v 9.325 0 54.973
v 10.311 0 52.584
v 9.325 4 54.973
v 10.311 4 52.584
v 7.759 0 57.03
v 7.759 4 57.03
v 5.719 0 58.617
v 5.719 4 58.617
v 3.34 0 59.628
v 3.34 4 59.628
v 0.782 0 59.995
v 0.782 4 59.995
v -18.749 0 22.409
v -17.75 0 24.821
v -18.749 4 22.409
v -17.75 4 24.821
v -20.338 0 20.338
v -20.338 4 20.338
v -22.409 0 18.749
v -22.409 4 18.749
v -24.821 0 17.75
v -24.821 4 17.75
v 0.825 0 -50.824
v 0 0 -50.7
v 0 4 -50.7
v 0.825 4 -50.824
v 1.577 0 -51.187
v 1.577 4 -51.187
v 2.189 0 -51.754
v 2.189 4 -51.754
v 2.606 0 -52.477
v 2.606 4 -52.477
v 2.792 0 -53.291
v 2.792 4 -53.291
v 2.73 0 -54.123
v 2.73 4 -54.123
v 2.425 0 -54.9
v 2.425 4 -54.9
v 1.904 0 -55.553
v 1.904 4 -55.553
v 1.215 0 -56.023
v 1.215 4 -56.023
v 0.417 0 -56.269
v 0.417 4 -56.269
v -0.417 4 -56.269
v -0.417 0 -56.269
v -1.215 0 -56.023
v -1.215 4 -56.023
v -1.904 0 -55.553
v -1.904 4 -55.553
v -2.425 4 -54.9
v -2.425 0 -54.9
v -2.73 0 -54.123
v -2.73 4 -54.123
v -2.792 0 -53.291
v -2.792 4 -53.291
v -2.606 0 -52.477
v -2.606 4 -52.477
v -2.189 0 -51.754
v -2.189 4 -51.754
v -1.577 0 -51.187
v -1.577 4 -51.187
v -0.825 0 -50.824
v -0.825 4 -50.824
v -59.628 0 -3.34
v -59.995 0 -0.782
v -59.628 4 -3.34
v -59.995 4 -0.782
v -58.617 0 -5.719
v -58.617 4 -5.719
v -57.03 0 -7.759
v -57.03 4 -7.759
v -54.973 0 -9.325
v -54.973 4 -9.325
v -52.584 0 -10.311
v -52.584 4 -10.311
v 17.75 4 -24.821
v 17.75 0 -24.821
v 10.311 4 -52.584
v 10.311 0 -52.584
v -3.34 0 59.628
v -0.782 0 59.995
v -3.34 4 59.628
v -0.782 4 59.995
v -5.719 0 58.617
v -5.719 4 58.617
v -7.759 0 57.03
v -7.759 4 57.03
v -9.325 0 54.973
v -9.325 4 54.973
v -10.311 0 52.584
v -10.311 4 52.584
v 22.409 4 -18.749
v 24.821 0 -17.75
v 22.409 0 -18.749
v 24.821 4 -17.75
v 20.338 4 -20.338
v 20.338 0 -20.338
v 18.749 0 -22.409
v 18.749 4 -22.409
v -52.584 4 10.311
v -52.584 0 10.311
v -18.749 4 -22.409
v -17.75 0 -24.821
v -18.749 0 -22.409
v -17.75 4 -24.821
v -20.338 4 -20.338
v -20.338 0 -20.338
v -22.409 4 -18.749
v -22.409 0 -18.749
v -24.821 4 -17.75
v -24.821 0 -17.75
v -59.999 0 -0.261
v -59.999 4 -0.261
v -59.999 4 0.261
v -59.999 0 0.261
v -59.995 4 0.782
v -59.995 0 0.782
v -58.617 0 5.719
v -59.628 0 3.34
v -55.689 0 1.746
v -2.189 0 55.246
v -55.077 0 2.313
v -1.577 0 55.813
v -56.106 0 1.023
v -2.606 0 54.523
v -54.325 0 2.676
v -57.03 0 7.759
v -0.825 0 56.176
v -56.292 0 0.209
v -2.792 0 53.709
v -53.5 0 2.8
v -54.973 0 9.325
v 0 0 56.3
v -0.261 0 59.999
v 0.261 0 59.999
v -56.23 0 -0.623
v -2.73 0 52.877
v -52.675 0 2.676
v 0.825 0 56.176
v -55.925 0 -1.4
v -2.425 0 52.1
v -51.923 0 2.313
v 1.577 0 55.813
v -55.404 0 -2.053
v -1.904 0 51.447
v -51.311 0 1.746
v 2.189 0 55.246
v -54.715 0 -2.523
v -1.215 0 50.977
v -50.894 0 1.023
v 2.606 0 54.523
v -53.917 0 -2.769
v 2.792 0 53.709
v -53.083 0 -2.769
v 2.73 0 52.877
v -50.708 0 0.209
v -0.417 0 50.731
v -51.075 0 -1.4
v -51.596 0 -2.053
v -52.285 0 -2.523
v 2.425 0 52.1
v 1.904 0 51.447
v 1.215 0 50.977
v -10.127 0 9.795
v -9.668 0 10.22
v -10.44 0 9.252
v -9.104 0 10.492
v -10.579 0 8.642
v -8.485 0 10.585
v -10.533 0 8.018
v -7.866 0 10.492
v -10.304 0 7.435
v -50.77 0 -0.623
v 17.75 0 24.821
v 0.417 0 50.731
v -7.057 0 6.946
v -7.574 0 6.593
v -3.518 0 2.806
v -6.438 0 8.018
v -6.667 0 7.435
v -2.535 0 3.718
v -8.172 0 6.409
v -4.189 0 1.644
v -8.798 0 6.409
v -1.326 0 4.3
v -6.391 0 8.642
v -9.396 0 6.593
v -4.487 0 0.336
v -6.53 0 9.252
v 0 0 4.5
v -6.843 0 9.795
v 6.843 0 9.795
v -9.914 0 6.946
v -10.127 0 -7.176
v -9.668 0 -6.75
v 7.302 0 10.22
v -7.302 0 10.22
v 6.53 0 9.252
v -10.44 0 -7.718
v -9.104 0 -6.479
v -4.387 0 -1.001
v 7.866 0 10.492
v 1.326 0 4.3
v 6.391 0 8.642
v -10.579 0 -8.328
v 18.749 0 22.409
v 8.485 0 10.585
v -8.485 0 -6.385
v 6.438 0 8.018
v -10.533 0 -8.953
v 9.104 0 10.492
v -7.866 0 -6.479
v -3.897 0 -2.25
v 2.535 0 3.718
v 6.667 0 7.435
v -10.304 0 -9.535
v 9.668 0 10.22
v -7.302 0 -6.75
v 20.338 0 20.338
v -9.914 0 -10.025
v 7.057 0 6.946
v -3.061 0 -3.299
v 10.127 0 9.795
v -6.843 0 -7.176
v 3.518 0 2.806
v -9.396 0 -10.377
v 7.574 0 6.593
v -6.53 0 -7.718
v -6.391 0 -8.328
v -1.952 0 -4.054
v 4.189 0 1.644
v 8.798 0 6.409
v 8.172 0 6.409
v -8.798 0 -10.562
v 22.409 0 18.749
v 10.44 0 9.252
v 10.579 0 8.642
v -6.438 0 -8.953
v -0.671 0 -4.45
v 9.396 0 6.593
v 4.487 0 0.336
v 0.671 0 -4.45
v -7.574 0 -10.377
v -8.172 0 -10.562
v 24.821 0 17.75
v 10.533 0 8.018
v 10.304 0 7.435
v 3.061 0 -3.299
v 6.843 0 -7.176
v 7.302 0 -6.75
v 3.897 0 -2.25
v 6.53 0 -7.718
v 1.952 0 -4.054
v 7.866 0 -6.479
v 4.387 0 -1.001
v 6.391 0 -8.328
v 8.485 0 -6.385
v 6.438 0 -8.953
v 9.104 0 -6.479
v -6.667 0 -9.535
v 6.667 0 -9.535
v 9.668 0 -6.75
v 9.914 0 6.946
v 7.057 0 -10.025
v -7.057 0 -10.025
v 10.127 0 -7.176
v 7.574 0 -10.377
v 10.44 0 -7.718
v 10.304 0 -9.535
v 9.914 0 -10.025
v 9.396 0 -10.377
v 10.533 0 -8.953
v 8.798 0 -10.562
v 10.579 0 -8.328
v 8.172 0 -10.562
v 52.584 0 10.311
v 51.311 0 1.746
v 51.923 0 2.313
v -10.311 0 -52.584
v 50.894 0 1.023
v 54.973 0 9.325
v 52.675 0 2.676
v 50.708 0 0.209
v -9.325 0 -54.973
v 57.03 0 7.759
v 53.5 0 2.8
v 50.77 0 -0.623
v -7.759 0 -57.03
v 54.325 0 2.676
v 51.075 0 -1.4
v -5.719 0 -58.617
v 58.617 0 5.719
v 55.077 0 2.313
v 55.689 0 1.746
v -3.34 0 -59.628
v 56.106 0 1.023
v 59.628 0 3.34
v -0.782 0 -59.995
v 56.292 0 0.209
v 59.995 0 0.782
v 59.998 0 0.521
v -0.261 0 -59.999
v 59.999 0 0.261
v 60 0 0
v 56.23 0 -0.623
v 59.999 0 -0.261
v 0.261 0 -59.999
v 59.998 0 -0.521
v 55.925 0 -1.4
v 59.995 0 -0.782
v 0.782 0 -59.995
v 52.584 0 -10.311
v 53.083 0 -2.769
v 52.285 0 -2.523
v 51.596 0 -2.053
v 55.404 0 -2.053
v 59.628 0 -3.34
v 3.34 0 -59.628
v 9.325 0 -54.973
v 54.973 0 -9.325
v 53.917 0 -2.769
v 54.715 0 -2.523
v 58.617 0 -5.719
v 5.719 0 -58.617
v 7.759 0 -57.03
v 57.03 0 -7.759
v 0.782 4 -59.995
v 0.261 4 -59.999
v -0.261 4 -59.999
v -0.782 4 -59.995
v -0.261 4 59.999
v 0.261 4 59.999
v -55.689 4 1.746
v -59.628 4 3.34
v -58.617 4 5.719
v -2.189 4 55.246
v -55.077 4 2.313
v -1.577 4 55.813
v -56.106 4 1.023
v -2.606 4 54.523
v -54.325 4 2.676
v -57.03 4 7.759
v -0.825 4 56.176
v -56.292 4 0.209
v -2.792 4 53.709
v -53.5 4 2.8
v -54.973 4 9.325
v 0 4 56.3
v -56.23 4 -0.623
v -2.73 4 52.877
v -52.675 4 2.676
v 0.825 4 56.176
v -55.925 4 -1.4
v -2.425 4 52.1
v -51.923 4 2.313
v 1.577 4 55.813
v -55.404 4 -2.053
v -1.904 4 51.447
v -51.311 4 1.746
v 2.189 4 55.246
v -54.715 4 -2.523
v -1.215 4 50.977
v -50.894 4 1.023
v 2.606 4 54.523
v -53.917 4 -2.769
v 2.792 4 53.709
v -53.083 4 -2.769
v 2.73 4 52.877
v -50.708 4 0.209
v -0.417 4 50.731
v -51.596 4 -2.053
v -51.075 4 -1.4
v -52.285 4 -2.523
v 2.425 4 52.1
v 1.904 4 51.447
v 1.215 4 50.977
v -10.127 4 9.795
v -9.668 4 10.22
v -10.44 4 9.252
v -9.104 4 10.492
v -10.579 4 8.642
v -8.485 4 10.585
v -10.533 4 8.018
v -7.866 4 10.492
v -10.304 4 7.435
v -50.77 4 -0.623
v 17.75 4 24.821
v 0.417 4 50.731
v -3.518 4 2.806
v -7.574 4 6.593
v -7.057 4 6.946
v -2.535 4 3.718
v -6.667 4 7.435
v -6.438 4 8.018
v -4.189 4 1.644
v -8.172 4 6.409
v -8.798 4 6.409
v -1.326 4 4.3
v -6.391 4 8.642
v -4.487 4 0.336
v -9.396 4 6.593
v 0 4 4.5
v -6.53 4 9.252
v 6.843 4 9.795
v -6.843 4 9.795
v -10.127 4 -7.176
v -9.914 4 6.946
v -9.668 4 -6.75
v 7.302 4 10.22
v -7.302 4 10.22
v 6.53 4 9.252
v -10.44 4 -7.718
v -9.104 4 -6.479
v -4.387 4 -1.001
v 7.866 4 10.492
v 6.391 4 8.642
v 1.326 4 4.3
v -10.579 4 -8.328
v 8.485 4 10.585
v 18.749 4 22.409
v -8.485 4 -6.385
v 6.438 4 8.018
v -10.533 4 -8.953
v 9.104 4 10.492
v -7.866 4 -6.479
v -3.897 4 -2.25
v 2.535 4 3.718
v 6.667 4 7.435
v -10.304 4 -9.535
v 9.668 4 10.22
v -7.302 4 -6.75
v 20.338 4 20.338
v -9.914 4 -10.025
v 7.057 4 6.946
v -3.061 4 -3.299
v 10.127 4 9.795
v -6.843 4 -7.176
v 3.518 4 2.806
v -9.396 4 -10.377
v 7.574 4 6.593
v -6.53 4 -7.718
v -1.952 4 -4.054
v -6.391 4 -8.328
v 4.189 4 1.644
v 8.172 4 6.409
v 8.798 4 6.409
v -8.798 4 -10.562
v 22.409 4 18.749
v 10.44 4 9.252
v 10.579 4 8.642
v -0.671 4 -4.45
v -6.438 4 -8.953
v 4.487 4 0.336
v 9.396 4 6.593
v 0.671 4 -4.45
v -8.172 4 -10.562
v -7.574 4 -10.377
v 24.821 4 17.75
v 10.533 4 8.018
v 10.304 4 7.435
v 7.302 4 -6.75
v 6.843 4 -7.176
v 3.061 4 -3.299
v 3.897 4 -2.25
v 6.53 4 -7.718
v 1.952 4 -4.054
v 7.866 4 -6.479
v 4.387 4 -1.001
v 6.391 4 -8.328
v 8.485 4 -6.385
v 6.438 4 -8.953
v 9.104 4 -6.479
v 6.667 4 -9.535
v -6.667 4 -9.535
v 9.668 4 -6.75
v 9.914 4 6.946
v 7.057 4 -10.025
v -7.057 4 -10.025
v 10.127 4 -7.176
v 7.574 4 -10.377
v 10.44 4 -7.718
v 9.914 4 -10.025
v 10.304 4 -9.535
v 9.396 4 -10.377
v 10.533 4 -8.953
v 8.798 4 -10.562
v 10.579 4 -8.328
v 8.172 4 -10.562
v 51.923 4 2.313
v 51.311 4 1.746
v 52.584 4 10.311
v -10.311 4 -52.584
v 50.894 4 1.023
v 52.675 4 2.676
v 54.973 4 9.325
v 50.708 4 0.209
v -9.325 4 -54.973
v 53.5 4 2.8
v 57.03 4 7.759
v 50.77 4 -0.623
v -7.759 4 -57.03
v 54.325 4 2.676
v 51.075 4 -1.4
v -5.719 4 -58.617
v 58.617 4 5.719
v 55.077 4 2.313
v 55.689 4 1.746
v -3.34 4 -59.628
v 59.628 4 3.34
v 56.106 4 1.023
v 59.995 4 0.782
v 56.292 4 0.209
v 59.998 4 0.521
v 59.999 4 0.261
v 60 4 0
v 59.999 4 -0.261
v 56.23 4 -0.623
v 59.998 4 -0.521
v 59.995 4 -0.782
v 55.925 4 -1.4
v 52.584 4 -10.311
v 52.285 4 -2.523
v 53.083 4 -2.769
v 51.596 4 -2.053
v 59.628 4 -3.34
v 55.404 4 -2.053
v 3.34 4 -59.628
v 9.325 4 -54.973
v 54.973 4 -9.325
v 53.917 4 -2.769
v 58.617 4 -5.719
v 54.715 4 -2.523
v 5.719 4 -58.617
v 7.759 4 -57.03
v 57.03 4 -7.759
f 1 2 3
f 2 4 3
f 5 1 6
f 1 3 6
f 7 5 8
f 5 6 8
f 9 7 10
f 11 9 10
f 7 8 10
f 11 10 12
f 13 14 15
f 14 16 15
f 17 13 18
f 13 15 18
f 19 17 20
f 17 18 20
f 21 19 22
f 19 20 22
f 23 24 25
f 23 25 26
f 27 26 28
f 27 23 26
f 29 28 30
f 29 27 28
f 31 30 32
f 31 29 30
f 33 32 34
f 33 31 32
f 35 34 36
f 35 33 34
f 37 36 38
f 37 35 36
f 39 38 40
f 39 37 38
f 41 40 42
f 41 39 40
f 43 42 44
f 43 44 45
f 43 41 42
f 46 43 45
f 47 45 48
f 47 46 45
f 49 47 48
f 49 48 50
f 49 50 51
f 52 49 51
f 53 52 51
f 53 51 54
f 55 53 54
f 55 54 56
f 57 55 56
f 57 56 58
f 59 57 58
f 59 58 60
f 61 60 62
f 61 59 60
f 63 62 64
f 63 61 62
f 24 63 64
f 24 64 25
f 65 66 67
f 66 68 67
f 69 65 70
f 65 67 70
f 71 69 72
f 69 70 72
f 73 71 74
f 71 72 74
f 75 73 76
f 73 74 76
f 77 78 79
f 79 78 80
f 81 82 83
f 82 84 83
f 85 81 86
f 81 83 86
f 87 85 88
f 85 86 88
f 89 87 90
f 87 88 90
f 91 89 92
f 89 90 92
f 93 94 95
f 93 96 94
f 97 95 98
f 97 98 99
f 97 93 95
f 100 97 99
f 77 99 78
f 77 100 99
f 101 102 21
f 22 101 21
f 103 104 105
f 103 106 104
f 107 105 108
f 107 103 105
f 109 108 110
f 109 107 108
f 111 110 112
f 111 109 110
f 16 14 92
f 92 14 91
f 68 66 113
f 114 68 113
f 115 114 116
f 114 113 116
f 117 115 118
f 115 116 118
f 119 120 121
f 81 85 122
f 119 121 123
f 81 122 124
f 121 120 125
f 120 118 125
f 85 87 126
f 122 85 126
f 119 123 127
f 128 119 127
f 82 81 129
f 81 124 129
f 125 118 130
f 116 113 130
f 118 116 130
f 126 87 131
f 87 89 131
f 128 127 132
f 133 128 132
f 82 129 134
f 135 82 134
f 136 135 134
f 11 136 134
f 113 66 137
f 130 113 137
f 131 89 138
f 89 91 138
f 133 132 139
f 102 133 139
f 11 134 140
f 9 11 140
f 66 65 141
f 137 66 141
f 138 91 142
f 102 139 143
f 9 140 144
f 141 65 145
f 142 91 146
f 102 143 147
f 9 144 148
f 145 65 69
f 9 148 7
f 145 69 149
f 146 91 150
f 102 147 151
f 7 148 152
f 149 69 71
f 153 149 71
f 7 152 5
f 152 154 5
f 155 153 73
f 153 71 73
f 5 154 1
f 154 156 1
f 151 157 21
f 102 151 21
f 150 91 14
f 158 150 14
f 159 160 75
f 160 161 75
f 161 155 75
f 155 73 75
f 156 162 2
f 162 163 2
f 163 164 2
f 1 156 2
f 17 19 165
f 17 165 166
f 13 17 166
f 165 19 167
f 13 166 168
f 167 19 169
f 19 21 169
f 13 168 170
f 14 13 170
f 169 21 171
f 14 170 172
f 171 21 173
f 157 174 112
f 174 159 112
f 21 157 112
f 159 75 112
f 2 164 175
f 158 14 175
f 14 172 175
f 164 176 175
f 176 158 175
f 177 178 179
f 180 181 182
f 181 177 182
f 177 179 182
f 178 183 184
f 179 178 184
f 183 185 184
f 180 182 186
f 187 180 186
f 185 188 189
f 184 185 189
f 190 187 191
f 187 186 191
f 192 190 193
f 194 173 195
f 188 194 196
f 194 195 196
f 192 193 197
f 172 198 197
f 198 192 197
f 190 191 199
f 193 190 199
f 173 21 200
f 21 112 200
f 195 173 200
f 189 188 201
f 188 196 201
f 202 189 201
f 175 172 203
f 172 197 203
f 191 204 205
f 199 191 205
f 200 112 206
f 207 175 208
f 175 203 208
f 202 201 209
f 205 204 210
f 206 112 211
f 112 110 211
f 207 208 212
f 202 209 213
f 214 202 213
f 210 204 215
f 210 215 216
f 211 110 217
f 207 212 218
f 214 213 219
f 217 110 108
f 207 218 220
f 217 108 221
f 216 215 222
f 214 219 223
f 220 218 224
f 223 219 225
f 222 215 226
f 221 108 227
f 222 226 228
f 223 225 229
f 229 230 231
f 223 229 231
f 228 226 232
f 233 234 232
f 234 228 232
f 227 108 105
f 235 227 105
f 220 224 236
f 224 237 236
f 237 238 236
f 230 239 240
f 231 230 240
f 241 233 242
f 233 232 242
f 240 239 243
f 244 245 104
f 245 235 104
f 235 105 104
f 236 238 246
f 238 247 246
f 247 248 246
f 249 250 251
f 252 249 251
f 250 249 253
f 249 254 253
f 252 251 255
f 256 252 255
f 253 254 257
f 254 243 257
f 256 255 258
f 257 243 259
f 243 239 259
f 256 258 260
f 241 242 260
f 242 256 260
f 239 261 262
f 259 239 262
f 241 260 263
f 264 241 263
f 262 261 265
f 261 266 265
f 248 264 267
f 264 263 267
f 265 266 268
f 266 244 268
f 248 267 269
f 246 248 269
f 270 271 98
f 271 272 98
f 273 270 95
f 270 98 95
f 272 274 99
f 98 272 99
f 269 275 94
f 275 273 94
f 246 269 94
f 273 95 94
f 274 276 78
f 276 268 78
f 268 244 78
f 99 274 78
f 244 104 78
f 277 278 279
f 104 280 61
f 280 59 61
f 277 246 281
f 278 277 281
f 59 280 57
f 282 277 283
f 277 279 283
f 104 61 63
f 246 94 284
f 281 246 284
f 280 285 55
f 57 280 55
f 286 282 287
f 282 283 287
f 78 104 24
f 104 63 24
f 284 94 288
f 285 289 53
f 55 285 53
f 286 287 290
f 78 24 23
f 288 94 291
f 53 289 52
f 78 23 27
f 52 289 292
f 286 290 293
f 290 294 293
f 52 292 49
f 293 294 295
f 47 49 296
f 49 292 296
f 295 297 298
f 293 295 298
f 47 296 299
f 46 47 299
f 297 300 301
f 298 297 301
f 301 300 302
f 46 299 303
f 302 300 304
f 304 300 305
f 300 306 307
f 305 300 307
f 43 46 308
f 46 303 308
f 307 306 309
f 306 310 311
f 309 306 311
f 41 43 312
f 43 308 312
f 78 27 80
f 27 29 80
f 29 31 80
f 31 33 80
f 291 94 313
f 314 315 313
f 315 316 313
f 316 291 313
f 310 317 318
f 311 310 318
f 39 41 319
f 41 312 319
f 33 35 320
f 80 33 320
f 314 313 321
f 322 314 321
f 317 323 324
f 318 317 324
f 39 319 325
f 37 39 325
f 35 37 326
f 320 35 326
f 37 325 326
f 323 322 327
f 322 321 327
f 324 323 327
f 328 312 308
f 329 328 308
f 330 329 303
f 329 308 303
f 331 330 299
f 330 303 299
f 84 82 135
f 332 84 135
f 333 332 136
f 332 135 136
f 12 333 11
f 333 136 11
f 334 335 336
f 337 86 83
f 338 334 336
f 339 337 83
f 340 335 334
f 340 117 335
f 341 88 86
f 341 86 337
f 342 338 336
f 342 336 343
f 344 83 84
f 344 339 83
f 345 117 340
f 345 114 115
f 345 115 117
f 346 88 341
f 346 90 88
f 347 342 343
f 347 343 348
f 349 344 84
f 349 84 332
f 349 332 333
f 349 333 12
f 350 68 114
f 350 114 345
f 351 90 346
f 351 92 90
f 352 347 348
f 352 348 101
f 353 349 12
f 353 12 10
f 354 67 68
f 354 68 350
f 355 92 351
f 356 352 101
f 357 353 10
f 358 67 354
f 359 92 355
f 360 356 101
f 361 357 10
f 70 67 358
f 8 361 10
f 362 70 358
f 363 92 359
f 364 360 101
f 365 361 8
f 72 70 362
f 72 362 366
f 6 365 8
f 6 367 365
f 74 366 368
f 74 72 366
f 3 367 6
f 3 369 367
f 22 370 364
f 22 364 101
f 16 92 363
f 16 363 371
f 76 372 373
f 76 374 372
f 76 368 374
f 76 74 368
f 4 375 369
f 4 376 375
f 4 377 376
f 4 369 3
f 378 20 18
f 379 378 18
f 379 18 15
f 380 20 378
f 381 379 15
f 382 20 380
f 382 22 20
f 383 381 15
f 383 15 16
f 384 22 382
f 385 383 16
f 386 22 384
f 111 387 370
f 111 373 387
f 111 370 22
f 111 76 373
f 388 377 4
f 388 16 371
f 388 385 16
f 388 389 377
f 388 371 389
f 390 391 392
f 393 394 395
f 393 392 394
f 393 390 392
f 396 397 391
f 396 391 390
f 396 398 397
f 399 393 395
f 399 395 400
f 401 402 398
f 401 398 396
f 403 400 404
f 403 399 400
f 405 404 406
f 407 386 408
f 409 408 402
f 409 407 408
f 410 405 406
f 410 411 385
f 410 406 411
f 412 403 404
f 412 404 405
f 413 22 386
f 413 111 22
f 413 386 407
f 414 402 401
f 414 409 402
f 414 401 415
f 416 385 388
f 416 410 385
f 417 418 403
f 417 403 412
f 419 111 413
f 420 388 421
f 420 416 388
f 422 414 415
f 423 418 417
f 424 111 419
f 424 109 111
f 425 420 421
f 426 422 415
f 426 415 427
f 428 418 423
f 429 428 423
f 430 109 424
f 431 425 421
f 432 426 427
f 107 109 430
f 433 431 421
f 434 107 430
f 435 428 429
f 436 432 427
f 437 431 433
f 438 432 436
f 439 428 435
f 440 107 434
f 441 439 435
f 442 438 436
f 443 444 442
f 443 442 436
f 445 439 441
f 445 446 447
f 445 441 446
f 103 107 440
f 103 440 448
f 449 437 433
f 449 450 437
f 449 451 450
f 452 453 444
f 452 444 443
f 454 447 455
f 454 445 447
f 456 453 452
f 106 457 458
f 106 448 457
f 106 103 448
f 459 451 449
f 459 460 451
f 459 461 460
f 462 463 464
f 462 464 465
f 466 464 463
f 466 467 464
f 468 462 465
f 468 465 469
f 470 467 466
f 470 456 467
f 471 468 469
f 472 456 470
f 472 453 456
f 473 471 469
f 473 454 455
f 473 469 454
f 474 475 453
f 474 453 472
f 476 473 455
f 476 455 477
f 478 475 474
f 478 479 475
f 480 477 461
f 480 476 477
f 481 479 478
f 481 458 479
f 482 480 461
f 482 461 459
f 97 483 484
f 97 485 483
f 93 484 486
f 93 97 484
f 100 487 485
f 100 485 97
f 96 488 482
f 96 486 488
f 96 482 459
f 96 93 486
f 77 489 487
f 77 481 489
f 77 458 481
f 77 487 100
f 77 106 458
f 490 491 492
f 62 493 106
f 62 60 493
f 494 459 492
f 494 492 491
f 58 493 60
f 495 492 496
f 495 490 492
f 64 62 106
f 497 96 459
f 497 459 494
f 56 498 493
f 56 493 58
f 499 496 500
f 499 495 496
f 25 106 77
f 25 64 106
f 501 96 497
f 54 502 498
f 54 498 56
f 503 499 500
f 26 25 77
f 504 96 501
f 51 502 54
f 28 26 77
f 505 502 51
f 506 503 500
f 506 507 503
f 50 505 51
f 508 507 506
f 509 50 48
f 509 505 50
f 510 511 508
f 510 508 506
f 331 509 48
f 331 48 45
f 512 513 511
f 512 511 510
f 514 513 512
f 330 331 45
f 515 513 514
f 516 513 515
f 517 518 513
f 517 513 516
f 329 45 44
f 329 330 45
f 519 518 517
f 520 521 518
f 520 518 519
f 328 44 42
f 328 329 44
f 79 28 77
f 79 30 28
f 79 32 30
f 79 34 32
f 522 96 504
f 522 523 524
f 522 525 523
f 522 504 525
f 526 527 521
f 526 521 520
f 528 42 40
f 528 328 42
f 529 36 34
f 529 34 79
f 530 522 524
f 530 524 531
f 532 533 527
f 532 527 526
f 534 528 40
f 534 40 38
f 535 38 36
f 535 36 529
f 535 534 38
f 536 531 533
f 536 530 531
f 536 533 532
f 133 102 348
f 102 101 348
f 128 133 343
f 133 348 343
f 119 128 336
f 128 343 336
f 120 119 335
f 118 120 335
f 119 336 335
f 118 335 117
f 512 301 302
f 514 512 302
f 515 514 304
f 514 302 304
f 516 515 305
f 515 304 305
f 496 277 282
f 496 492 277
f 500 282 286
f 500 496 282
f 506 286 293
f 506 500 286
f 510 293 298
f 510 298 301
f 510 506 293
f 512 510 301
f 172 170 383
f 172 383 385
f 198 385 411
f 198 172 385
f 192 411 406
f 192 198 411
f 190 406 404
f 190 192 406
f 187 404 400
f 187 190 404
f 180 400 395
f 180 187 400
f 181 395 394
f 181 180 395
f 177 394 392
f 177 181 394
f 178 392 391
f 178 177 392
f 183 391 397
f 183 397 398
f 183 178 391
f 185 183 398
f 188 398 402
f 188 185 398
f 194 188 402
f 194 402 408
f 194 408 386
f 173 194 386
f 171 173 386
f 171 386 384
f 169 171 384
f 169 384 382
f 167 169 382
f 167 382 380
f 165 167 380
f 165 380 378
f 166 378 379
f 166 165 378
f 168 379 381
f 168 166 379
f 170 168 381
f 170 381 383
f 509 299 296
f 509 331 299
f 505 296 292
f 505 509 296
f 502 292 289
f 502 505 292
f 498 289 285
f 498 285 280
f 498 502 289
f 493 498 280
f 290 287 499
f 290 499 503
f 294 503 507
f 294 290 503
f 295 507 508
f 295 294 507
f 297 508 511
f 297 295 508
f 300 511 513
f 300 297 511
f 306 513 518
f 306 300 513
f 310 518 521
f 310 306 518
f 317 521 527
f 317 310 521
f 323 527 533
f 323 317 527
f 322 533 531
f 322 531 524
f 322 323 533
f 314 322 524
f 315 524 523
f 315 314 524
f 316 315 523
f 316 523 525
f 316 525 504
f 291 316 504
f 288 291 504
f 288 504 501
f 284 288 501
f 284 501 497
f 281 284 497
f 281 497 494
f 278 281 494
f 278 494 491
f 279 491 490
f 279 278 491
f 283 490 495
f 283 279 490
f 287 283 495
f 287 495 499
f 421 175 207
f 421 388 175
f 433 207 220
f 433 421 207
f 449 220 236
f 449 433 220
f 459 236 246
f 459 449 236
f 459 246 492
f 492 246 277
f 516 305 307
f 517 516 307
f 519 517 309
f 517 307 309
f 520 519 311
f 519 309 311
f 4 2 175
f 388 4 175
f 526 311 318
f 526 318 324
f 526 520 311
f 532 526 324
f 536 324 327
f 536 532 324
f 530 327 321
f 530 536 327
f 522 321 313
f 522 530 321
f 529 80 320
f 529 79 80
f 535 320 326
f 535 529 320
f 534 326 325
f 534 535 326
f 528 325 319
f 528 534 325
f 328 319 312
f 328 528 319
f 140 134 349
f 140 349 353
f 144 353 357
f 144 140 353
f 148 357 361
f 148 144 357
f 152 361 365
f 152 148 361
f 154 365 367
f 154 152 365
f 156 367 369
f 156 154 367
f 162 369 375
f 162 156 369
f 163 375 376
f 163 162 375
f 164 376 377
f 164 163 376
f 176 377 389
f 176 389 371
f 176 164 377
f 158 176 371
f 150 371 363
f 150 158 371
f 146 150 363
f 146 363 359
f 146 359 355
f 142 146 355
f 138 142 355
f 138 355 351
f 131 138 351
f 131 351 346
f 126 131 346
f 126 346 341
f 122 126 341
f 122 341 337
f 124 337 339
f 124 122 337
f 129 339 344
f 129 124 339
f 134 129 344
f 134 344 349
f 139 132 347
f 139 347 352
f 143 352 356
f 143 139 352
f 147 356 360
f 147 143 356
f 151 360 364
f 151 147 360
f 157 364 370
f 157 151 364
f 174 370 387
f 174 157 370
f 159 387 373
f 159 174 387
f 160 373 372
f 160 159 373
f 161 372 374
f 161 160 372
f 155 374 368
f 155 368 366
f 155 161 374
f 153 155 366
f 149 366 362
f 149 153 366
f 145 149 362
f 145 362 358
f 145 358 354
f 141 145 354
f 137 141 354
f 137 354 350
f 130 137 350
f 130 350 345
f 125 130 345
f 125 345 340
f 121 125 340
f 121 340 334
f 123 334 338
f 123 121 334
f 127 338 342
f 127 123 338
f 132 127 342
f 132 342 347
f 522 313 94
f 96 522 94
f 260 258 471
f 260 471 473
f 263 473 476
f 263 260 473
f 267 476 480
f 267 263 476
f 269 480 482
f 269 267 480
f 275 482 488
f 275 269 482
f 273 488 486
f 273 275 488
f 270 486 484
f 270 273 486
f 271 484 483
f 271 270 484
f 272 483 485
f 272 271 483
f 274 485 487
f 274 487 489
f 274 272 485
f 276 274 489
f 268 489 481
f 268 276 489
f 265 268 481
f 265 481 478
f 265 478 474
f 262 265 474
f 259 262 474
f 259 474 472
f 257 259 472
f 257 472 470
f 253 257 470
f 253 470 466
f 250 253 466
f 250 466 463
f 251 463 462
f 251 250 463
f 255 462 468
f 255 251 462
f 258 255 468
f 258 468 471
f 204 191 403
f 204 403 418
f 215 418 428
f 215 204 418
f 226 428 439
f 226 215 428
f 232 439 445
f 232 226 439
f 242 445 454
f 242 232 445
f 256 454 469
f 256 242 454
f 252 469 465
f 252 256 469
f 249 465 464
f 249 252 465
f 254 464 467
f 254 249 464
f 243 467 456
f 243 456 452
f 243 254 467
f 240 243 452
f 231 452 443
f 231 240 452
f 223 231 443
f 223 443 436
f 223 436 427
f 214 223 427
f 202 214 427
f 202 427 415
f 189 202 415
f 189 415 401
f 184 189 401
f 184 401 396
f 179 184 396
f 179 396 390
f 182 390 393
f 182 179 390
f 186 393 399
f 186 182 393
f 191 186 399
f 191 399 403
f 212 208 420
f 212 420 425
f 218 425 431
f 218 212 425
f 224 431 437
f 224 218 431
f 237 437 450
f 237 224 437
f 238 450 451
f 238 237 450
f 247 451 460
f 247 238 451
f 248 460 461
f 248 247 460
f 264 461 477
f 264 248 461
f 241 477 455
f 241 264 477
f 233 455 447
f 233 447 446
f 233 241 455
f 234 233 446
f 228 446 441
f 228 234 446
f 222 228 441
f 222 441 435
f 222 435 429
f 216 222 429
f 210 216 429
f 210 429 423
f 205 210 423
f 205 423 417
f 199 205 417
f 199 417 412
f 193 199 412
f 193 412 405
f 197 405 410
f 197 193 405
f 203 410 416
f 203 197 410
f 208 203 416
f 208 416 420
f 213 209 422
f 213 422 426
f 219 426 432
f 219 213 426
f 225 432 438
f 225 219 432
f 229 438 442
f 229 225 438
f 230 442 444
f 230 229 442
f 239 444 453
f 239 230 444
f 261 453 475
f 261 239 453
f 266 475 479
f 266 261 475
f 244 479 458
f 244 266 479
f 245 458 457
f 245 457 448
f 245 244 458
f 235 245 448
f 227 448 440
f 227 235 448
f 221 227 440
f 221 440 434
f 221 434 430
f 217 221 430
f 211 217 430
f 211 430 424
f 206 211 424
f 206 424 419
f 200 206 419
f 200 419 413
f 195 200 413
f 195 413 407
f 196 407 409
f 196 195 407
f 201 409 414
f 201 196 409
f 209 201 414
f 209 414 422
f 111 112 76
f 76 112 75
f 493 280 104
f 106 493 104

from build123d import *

# Parameters (mm, degrees)
SKETCH_1_R      = 2.8
SKETCH_1_R_2    = 2.1
SKETCH_1_R_3    = 4.5
EXTRUDE_1_DEPTH = 4
FILLET_1_R      = 10


with BuildPart() as part:
    # 草图1 → 凸台-拉伸1 (new body)
    # profile 1 of 5: a face of its own
    with BuildSketch(Plane(origin=(0, 0, 0), x_dir=(1, 0, 0), z_dir=(0, 1, 0))):
        with BuildLine():
            Line((-24.400651417, 0), (-19.24418704, 19.24418704))
            Line((-19.24418704, 19.24418704), (-59.39696962, 8.485281374))
            ThreePointArc((-59.39696962, 8.485281374), (-60, 0), (-59.39696962, -8.485281374))
            Line((-59.39696962, -8.485281374), (-19.24418704, -19.24418704))
            Line((-19.24418704, -19.24418704), (-24.400651417, 0))
        make_face()
        with Locations(Location((-53.5, 0, 0), (0, 0, 270))):
            Circle(SKETCH_1_R, mode=Mode.SUBTRACT)
    # profile 2 of 5: a face of its own
    with BuildSketch(Plane(origin=(0, 0, 0), x_dir=(1, 0, 0), z_dir=(0, 1, 0))):
        Polygon((24.400651417, 0), (19.24418704, 19.24418704), (0, 24.400651417), (-19.24418704, 19.24418704), (-24.400651417, 0), (-19.24418704, -19.24418704), (0, -24.400651417), (19.24418704, -19.24418704), align=None)
        with Locations(Location((-8.485281374, -8.485281374, 0), (0, 0, 270))):
            Circle(SKETCH_1_R_2, mode=Mode.SUBTRACT)
        with Locations(Location((0, 0, 0), (0, 0, 270))):
            Circle(SKETCH_1_R_3, mode=Mode.SUBTRACT)
        with Locations(Location((8.485281374, -8.485281374, 0), (0, 0, 270))):
            Circle(SKETCH_1_R_2, mode=Mode.SUBTRACT)
        with Locations(Location((-8.485281374, 8.485281374, 0), (0, 0, 270))):
            Circle(SKETCH_1_R_2, mode=Mode.SUBTRACT)
        with Locations(Location((8.485281374, 8.485281374, 0), (0, 0, 270))):
            Circle(SKETCH_1_R_2, mode=Mode.SUBTRACT)
    # profile 3 of 5: a face of its own
    with BuildSketch(Plane(origin=(0, 0, 0), x_dir=(1, 0, 0), z_dir=(0, 1, 0))):
        with BuildLine():
            Line((19.24418704, 19.24418704), (8.485281374, 59.39696962))
            ThreePointArc((8.485281374, 59.39696962), (0, 60), (-8.485281374, 59.39696962))
            Line((-8.485281374, 59.39696962), (-19.24418704, 19.24418704))
            Line((-19.24418704, 19.24418704), (0, 24.400651417))
            Line((0, 24.400651417), (19.24418704, 19.24418704))
        make_face()
        with Locations(Location((0, 53.5, 0), (0, 0, 270))):
            Circle(SKETCH_1_R, mode=Mode.SUBTRACT)
    # profile 4 of 5: a face of its own
    with BuildSketch(Plane(origin=(0, 0, 0), x_dir=(1, 0, 0), z_dir=(0, 1, 0))):
        with BuildLine():
            Line((59.39696962, 8.485281374), (19.24418704, 19.24418704))
            Line((19.24418704, 19.24418704), (24.400651417, 0))
            Line((24.400651417, 0), (19.24418704, -19.24418704))
            Line((19.24418704, -19.24418704), (59.39696962, -8.485281374))
            ThreePointArc((59.39696962, -8.485281374), (59.849052529, -4.253341205), (60, 0))
            ThreePointArc((60, 0), (59.849052529, 4.253341205), (59.39696962, 8.485281374))
        make_face()
        with Locations(Location((53.5, 0, 0), (0, 0, 270))):
            Circle(SKETCH_1_R, mode=Mode.SUBTRACT)
    # profile 5 of 5: a face of its own
    with BuildSketch(Plane(origin=(0, 0, 0), x_dir=(1, 0, 0), z_dir=(0, 1, 0))):
        with BuildLine():
            Line((8.485281374, -59.39696962), (19.24418704, -19.24418704))
            Line((19.24418704, -19.24418704), (0, -24.400651417))
            Line((0, -24.400651417), (-19.24418704, -19.24418704))
            Line((-19.24418704, -19.24418704), (-8.485281374, -59.39696962))
            ThreePointArc((-8.485281374, -59.39696962), (0, -60), (8.485281374, -59.39696962))
        make_face()
        with Locations(Location((0, -53.5, 0), (0, 0, 270))):
            Circle(SKETCH_1_R, mode=Mode.SUBTRACT)
    extrude(amount=EXTRUDE_1_DEPTH)

    # 圆角1
    fillet_1_edges = [part.edges().sort_by_distance(p)[0] for p in [
        (-19.24418704, 2, -19.24418704),
        (-8.485281374, 2, -59.39696962),
        (8.485281374, 2, -59.39696962),
        (19.24418704, 2, -19.24418704),
        (59.39696962, 2, -8.485281374),
        (59.39696962, 2, 8.485281374),
        (19.24418704, 2, 19.24418704),
        (8.485281374, 2, 59.39696962),
        (-8.485281374, 2, 59.39696962),
        (-19.24418704, 2, 19.24418704),
        (-59.39696962, 2, 8.485281374),
        (-59.39696962, 2, -8.485281374),
    ]]
    fillet(fillet_1_edges, radius=FILLET_1_R)


solid = part.part
